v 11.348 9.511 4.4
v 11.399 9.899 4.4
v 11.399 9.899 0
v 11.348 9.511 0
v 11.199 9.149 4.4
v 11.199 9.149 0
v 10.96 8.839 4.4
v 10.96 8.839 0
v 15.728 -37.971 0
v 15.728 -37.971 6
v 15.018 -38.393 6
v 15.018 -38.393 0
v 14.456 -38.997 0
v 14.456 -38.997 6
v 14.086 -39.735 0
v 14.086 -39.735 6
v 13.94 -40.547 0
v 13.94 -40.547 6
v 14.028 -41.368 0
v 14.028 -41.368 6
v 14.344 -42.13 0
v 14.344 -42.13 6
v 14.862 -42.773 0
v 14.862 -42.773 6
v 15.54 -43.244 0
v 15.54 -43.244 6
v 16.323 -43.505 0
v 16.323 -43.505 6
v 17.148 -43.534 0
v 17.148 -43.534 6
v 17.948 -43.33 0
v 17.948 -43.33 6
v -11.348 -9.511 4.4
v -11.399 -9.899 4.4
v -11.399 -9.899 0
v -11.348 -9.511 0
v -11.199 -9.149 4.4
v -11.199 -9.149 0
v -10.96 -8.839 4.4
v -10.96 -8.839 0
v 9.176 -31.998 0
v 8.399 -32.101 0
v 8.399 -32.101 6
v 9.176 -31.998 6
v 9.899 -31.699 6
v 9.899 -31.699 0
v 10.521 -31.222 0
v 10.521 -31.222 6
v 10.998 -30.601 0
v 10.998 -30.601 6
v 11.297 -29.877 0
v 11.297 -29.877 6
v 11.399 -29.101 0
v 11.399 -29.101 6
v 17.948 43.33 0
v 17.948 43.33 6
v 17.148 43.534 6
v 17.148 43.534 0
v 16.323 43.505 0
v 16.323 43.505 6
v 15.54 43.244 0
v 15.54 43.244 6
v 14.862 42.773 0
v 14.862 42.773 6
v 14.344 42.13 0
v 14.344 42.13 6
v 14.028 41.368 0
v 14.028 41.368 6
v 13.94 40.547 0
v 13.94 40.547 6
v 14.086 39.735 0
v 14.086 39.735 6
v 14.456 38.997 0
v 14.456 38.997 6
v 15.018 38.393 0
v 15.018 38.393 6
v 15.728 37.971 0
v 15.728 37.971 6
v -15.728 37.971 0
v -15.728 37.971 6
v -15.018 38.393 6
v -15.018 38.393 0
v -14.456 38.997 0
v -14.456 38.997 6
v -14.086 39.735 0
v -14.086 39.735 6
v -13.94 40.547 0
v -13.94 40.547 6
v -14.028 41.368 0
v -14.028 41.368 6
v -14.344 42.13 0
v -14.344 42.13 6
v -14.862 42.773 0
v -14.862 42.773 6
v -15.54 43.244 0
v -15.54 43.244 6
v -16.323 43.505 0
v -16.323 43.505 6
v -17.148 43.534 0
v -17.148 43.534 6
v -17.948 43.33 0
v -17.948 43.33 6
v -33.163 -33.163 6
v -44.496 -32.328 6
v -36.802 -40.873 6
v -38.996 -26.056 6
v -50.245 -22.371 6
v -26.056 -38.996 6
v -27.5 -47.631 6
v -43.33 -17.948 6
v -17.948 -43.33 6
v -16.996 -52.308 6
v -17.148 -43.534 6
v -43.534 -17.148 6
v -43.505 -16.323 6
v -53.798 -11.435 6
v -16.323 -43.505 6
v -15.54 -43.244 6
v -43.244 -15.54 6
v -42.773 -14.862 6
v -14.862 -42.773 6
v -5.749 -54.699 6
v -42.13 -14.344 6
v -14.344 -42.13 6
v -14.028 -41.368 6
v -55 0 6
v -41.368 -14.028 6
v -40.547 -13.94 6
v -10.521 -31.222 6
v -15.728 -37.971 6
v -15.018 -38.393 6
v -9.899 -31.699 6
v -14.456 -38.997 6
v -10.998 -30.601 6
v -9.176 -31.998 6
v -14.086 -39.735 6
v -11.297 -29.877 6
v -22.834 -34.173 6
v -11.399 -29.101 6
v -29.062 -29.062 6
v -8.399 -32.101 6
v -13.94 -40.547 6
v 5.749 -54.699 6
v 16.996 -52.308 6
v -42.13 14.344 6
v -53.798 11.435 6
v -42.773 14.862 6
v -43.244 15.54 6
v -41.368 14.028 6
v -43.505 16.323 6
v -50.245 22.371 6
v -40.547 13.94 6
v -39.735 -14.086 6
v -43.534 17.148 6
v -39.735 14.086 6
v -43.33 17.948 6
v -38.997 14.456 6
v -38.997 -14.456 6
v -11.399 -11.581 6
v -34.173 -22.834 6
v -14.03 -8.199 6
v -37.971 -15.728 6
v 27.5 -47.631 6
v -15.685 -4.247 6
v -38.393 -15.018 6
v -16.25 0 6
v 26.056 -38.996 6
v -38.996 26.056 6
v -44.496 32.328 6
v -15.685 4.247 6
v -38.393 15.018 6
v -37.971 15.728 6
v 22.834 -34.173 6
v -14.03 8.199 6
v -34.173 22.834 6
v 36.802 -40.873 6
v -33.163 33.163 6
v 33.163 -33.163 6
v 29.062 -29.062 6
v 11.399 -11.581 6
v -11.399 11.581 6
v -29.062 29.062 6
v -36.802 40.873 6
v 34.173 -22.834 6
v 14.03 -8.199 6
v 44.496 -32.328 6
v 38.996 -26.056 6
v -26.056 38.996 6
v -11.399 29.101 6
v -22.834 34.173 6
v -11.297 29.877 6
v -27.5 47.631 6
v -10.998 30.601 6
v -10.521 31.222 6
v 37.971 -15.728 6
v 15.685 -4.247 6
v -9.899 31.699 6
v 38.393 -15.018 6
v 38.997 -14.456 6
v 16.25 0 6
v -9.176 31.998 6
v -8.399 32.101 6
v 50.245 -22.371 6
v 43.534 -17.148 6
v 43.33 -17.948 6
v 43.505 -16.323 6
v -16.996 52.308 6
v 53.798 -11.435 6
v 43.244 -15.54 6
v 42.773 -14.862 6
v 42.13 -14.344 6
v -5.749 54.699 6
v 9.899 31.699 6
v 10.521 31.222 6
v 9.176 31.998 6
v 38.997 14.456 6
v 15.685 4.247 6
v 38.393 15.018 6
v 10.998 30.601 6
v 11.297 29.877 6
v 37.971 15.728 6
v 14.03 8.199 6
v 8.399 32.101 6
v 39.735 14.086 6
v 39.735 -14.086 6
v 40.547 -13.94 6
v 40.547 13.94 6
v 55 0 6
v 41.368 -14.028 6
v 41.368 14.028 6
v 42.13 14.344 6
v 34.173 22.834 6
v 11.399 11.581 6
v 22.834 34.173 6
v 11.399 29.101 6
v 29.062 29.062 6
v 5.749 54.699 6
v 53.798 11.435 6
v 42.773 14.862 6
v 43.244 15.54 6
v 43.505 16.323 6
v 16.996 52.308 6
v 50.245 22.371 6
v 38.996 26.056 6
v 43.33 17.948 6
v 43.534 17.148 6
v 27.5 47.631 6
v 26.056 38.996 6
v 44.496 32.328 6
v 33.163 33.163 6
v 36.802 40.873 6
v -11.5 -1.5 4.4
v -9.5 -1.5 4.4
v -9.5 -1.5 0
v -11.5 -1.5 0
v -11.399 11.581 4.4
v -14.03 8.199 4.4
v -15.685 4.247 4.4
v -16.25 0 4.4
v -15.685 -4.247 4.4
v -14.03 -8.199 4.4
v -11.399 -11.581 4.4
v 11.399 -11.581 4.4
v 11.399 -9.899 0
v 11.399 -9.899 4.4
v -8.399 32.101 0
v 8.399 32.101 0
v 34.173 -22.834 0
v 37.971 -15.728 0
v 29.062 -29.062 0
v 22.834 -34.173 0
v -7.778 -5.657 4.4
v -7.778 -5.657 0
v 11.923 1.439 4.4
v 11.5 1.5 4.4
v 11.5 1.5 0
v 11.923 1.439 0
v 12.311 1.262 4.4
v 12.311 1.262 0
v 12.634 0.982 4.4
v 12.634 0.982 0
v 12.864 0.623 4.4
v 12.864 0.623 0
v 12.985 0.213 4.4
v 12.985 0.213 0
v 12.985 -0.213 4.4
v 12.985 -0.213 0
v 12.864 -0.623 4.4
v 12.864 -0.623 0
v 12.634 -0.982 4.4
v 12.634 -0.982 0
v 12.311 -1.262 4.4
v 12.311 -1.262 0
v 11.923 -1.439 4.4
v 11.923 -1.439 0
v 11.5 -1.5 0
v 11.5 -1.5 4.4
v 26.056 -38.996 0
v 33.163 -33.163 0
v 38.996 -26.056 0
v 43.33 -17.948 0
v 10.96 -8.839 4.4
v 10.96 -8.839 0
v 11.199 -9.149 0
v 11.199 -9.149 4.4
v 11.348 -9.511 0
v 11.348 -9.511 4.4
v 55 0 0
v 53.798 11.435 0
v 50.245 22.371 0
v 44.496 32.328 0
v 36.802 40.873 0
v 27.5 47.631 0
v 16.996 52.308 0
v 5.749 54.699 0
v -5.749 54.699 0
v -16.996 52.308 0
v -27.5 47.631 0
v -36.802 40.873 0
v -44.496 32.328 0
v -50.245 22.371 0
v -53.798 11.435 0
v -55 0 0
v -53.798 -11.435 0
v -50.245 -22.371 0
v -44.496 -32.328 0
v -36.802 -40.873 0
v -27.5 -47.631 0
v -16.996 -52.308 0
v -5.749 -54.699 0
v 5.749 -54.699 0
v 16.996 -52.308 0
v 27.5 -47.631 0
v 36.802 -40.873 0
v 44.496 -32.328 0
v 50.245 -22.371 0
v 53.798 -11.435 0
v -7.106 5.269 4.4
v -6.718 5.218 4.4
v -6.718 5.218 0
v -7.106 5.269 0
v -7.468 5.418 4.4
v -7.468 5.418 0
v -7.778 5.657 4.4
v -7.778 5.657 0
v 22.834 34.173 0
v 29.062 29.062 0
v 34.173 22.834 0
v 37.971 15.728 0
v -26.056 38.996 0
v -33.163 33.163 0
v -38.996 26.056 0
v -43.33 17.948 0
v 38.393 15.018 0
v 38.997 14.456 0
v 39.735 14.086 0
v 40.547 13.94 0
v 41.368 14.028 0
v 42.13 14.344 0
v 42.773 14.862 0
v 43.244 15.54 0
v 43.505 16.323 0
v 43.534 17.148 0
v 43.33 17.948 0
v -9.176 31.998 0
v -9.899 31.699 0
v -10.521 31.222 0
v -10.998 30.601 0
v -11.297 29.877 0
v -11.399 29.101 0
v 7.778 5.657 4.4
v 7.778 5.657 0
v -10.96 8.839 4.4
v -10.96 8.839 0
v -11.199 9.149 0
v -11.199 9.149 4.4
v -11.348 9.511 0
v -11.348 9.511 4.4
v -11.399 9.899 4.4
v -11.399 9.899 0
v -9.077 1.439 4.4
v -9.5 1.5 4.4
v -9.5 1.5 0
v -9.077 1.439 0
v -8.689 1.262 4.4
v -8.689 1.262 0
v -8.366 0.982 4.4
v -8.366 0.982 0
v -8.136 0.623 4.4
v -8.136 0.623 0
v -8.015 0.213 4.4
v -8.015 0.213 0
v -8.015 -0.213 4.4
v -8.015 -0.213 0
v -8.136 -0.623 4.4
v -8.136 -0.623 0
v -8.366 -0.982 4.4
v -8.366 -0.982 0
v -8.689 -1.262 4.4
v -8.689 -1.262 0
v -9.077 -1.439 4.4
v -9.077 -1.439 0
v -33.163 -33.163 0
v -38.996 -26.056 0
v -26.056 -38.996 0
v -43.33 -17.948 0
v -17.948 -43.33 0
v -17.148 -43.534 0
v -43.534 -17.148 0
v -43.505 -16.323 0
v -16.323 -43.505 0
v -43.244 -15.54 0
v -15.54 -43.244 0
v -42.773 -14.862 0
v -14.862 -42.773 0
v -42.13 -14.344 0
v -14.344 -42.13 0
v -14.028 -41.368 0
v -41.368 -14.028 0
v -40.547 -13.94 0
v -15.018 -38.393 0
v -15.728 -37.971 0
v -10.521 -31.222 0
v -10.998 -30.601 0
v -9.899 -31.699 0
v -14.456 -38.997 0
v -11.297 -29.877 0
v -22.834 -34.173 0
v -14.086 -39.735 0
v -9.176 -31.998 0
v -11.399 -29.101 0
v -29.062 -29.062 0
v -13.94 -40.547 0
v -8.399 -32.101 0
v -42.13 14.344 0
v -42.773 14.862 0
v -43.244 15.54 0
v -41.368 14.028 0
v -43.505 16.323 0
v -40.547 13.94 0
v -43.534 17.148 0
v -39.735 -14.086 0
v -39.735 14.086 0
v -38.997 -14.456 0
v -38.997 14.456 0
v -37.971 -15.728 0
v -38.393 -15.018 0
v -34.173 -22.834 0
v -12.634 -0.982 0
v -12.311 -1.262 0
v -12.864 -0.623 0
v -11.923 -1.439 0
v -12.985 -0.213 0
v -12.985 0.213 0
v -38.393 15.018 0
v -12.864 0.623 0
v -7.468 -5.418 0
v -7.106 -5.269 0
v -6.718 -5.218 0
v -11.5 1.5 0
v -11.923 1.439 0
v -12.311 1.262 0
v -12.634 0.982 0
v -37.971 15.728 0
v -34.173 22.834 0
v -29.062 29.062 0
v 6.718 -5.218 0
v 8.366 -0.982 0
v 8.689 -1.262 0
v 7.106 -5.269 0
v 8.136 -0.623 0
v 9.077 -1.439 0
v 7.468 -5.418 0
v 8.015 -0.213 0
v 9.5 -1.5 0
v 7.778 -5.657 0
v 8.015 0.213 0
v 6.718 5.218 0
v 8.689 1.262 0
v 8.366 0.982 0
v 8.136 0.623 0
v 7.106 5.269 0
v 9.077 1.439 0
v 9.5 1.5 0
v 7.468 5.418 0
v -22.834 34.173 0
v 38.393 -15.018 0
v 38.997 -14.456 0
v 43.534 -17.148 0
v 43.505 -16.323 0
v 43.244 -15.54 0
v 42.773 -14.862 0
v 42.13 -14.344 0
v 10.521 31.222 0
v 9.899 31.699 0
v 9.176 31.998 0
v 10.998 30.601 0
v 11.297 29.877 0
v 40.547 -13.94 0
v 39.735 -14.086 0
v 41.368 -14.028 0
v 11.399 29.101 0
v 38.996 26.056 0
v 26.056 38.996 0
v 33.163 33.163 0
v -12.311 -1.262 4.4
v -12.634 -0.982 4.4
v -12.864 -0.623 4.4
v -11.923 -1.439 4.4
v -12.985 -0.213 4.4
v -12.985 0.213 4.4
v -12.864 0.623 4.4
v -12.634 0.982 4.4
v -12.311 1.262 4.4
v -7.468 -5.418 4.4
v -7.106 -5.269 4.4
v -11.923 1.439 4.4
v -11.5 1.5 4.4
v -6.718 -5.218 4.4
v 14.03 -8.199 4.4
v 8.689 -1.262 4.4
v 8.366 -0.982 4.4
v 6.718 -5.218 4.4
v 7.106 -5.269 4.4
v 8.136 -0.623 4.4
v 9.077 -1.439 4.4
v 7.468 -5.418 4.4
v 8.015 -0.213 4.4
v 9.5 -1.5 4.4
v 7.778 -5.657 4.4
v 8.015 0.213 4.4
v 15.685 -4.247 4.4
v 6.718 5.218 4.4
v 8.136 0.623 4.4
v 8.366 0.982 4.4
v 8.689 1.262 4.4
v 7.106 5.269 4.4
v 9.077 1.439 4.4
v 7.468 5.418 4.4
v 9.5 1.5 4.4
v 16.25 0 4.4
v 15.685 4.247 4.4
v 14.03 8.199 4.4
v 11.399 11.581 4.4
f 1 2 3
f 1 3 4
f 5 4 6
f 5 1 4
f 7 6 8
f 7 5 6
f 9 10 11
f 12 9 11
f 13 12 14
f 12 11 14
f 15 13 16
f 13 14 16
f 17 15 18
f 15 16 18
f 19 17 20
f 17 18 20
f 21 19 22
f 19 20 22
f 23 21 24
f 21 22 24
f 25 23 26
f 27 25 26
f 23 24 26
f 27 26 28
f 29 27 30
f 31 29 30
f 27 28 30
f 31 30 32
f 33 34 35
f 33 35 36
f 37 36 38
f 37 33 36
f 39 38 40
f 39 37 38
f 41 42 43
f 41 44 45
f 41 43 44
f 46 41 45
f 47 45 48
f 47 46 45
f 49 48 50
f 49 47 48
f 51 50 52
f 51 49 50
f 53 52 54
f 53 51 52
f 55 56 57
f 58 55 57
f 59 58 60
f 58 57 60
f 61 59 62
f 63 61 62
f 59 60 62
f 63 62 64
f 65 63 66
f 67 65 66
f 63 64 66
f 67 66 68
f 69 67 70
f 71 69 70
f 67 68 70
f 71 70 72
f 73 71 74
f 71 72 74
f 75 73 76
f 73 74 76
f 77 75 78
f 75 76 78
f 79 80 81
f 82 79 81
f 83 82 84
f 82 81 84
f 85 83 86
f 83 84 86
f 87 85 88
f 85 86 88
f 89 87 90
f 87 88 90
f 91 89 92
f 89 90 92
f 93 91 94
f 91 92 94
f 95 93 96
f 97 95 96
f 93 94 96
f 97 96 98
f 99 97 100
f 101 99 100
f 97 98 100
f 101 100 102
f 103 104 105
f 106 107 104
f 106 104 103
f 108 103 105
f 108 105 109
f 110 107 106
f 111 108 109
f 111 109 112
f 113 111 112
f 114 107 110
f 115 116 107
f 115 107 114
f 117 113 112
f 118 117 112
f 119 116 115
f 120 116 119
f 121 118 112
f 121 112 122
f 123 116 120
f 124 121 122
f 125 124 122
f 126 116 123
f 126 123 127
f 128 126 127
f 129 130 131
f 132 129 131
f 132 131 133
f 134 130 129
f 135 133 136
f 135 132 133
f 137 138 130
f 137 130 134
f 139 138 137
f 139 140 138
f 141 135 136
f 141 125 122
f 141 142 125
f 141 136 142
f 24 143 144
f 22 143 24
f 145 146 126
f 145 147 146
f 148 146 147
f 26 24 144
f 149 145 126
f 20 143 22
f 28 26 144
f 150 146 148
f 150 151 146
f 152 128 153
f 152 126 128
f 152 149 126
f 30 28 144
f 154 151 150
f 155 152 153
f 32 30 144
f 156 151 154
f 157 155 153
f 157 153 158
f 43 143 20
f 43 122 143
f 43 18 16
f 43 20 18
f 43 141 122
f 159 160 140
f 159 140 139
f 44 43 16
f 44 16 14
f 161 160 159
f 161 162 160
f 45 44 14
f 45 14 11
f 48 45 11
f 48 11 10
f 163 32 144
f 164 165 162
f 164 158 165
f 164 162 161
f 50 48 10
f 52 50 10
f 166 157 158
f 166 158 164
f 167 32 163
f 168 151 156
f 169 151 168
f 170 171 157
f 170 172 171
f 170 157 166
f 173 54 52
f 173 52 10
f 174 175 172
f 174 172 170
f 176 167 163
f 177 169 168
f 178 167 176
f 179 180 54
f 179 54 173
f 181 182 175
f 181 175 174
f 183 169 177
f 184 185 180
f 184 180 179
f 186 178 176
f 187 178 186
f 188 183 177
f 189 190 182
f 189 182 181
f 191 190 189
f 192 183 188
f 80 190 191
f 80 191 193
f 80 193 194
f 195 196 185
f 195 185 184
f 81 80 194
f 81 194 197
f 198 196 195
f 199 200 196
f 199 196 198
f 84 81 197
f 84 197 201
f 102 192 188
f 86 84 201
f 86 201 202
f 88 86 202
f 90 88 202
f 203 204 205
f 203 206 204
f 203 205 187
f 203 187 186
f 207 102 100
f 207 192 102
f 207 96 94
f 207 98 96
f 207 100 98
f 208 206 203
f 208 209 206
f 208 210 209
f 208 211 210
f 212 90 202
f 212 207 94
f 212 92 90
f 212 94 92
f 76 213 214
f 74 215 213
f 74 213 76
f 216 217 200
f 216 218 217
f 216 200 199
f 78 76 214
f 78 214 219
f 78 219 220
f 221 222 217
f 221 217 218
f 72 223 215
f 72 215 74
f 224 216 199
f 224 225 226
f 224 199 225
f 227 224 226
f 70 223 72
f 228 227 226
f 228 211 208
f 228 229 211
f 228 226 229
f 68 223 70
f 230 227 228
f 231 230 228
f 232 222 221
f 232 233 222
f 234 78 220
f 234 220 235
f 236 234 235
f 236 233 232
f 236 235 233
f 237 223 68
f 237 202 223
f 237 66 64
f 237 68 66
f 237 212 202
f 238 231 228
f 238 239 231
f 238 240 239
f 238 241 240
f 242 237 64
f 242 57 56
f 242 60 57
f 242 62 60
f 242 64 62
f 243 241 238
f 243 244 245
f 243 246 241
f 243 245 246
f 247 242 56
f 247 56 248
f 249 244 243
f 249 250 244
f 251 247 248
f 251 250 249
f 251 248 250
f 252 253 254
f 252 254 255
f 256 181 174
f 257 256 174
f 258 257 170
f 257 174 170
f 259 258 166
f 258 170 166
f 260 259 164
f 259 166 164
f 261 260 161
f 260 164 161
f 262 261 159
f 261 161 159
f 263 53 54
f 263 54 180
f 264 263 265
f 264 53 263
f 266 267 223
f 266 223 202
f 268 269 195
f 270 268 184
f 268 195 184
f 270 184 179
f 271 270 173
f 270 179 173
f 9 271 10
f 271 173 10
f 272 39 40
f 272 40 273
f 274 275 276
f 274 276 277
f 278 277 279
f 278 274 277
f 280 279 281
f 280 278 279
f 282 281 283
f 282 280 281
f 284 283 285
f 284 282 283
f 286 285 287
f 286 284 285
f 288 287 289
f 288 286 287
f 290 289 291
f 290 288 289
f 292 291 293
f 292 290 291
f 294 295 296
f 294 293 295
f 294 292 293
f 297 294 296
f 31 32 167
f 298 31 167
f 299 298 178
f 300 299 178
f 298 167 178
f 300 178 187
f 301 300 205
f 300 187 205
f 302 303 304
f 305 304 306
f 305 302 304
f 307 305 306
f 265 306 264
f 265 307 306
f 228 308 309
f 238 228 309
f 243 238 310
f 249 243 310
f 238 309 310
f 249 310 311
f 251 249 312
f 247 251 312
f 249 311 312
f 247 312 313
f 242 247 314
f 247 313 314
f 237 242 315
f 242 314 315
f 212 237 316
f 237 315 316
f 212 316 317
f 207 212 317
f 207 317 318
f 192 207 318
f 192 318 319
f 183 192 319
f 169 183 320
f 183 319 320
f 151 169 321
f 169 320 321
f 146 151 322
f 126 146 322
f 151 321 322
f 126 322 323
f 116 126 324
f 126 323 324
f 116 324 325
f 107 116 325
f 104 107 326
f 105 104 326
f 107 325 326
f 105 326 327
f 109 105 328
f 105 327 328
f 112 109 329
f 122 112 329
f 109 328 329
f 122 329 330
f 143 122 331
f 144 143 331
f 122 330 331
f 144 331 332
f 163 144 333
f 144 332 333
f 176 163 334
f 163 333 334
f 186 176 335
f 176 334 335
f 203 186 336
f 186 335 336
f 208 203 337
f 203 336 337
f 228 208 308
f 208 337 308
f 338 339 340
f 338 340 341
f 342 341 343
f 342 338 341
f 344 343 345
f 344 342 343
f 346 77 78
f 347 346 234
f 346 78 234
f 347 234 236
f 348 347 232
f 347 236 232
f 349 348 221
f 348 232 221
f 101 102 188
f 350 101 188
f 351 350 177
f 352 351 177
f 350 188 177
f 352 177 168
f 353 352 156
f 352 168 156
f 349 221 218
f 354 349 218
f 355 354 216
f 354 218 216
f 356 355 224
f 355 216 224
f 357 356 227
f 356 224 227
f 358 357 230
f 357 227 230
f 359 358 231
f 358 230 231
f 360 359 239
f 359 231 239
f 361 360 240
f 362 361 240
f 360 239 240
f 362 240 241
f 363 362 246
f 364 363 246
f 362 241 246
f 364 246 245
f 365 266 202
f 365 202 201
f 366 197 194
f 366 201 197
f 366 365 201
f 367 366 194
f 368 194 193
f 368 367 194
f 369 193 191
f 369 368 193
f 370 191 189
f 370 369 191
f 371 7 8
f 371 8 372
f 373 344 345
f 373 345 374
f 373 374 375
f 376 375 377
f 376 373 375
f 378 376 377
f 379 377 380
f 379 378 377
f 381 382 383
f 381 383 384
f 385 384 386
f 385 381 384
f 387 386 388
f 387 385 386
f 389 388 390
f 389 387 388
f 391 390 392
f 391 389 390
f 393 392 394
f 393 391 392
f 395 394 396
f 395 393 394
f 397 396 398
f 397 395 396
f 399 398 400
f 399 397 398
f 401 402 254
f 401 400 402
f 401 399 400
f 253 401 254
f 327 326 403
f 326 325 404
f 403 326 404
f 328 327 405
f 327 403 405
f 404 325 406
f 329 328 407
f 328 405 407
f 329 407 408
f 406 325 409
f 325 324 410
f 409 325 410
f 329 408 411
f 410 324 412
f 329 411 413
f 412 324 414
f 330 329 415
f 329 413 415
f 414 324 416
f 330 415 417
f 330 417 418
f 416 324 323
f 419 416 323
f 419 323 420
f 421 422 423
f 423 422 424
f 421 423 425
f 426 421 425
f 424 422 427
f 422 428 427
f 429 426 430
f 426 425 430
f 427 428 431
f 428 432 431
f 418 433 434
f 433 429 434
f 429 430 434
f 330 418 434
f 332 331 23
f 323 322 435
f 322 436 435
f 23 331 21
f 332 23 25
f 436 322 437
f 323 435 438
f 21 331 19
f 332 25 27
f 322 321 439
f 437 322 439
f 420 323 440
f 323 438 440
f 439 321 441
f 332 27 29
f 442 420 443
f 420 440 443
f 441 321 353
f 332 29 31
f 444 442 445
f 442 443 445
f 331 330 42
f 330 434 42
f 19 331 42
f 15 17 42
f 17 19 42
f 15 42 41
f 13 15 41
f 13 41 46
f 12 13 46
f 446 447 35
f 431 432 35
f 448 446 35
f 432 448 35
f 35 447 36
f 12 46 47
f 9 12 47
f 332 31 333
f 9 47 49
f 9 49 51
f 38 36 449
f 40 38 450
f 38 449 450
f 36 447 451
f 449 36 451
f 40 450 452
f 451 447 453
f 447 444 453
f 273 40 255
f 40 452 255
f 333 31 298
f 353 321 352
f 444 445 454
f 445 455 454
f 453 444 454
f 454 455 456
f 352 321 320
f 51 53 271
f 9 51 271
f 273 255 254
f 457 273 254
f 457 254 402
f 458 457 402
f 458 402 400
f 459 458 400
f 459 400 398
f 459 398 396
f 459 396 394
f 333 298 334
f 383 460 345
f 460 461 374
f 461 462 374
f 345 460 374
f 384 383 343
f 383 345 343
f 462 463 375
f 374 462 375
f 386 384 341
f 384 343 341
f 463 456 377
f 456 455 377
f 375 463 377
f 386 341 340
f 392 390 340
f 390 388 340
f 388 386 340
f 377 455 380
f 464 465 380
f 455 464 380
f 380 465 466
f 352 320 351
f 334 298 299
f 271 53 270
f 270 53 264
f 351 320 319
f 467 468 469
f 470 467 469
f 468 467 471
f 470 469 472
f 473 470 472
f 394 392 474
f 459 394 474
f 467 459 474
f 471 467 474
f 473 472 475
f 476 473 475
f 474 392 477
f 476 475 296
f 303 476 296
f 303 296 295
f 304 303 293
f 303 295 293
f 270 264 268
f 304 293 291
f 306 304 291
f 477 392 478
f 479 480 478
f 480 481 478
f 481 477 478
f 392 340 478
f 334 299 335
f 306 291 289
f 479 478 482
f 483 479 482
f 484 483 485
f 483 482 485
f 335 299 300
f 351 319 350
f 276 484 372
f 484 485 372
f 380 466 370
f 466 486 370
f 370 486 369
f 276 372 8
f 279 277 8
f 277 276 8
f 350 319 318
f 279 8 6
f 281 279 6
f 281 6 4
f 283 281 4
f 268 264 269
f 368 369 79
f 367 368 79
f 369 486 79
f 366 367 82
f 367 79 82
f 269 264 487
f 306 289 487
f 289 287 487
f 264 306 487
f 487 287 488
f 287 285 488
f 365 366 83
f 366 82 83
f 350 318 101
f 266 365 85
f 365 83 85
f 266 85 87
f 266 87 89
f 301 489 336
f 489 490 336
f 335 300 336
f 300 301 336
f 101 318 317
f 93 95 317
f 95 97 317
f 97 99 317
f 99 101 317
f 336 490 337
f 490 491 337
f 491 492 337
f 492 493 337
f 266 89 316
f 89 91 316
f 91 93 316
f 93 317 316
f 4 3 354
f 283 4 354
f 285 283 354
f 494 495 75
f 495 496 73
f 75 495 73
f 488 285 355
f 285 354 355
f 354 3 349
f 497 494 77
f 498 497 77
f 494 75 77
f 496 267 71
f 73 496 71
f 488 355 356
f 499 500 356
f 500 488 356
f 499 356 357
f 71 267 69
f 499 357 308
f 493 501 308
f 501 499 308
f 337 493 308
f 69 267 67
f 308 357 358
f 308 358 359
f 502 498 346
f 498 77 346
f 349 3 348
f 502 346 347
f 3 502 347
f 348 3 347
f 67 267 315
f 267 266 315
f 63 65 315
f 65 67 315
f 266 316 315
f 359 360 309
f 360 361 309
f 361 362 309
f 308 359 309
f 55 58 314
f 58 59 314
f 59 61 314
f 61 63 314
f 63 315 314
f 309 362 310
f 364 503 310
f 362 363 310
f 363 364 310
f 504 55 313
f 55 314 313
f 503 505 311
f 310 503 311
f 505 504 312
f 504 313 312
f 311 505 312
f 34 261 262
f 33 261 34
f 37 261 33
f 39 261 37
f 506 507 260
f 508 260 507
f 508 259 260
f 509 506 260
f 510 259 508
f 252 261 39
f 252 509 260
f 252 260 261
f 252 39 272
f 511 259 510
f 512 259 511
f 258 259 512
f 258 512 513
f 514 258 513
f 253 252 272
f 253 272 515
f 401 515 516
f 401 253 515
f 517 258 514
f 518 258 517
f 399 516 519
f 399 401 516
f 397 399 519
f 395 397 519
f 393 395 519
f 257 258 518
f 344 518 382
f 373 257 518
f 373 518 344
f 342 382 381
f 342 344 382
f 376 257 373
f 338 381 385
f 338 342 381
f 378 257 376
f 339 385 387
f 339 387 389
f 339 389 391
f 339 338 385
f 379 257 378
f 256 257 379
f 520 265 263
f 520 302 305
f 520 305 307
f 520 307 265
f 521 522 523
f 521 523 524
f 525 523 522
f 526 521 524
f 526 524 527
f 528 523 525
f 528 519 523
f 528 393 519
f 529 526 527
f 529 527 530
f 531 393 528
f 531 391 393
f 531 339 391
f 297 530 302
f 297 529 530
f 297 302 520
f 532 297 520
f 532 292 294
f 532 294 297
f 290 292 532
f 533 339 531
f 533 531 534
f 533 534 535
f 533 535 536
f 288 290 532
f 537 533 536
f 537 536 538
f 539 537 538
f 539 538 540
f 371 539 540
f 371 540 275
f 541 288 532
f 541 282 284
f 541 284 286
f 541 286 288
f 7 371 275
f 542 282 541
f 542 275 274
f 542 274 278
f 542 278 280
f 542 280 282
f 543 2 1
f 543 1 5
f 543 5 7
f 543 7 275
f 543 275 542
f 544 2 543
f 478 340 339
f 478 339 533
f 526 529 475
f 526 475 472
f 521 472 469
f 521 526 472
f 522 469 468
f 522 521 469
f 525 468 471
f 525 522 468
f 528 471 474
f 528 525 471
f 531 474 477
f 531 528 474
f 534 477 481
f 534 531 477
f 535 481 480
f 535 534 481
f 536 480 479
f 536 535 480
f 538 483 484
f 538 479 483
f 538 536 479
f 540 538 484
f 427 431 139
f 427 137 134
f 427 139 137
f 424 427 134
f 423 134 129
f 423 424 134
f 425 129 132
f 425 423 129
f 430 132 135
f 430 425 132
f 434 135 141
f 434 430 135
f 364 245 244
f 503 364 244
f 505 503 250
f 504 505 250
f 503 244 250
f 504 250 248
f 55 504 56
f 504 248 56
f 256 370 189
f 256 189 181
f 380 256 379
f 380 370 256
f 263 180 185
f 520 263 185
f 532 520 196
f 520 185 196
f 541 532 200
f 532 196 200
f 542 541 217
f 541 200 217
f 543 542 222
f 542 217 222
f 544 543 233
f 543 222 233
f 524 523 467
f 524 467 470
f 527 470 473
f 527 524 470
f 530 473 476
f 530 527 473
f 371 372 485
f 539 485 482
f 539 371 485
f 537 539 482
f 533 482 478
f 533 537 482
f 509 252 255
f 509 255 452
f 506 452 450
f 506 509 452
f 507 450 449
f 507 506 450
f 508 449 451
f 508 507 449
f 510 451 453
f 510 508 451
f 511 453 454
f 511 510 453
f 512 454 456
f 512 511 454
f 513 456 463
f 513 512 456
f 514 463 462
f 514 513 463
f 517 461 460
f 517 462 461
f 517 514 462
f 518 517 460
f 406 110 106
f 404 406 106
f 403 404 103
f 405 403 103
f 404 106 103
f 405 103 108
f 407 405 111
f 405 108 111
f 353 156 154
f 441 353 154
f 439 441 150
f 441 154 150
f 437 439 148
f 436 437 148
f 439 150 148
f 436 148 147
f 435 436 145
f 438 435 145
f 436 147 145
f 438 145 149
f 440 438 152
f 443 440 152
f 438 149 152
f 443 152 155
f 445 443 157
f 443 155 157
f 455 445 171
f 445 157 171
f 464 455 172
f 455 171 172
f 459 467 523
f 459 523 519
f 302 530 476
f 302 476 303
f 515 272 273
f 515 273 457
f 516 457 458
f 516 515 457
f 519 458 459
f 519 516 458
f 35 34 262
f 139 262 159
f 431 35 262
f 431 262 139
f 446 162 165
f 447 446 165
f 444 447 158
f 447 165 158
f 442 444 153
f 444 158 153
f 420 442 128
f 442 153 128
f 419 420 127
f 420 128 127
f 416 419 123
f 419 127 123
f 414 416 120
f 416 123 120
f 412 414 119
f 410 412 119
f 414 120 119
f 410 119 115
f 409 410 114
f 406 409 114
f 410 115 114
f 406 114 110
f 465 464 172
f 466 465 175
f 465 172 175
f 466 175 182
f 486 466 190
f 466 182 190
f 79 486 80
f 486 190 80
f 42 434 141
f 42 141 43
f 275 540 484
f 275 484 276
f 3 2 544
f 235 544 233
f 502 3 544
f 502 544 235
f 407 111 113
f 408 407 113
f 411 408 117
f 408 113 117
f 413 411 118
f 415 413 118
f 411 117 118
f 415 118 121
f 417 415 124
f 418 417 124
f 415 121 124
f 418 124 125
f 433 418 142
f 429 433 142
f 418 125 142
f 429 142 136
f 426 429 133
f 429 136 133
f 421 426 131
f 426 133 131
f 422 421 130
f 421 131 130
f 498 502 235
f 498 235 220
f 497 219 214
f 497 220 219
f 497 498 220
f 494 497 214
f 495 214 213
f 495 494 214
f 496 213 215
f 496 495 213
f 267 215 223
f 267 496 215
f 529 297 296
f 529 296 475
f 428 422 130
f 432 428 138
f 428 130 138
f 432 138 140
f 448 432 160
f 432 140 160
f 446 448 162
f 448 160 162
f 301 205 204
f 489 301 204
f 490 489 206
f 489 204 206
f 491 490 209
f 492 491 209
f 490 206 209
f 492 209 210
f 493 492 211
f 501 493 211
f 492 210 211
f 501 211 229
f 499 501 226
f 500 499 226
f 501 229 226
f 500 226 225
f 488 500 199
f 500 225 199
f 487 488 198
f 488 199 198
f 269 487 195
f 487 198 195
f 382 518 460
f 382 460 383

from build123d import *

# Parameters (mm, degrees)
SKETCH1_R               = 55
BOSS_EXTRUDE1_DEPTH     = 6
CUT_EXTRUDE1_DEPTH      = 79.012819459
SKETCH4_R               = 16.25
CUT_EXTRUDE2_DEPTH      = 1.6
CUT_EXTRUDE3_DEPTH      = 78.906097322
CUT_EXTRUDE4_DEPTH      = 78.906097322
CUT_EXTRUDE4_DEPTH_BACK = 78.906097322


with BuildPart() as part:
    # Sketch1 → Boss-Extrude1 (new body)
    with BuildSketch(Plane.XY):
        Circle(SKETCH1_R)
    extrude(amount=BOSS_EXTRUDE1_DEPTH)

    # Sketch3 → Cut-Extrude1 (cut, through all)
    with BuildSketch(Plane.XY.offset(6)):
        with BuildLine():
            ThreePointArc((-15.72828907, 37.971448786), (-14.15882038, 41.760481384), (-17.947852978, 43.329950075))
            ThreePointArc((-17.947852978, 43.329950075), (-33.163308038, 33.163308038), (-43.329950075, 17.947852978))
            ThreePointArc((-43.329950075, 17.947852978), (-41.760481384, 14.15882038), (-37.971448786, 15.72828907))
            ThreePointArc((-37.971448786, 15.72828907), (-29.062088707, 29.062088707), (-15.72828907, 37.971448786))
        make_face()
        with BuildLine():
            ThreePointArc((17.947852978, 43.329950075), (14.15882038, 41.760481384), (15.72828907, 37.971448786))
            ThreePointArc((15.72828907, 37.971448786), (29.062088707, 29.062088707), (37.971448786, 15.72828907))
            ThreePointArc((37.971448786, 15.72828907), (41.760481384, 14.15882038), (43.329950075, 17.947852978))
            ThreePointArc((43.329950075, 17.947852978), (33.163308038, 33.163308038), (17.947852978, 43.329950075))
        make_face()
        with BuildLine():
            ThreePointArc((43.329950075, -17.947852978), (41.760481384, -14.15882038), (37.971448786, -15.72828907))
            ThreePointArc((37.971448786, -15.72828907), (29.062088707, -29.062088707), (15.72828907, -37.971448786))
            ThreePointArc((15.72828907, -37.971448786), (14.15882038, -41.760481384), (17.947852978, -43.329950075))
            ThreePointArc((17.947852978, -43.329950075), (33.163308038, -33.163308038), (43.329950075, -17.947852978))
        make_face()
        with BuildLine():
            ThreePointArc((-17.947852978, -43.329950075), (-14.15882038, -41.760481384), (-15.72828907, -37.971448786))
            ThreePointArc((-15.72828907, -37.971448786), (-29.062088707, -29.062088707), (-37.971448786, -15.72828907))
            ThreePointArc((-37.971448786, -15.72828907), (-41.760481384, -14.15882038), (-43.329950075, -17.947852978))
            ThreePointArc((-43.329950075, -17.947852978), (-33.163308038, -33.163308038), (-17.947852978, -43.329950075))
        make_face()
    extrude(amount=-CUT_EXTRUDE1_DEPTH, mode=Mode.SUBTRACT)

    # Sketch4 → Cut-Extrude2 (cut)
    with BuildSketch(Plane.XY.offset(6)):
        Circle(SKETCH4_R)
    extrude(amount=-CUT_EXTRUDE2_DEPTH, mode=Mode.SUBTRACT)

    # Sketch5 → Cut-Extrude3 (cut, through all)
    with BuildSketch(Plane.XY.offset(4.4)):
        with BuildLine():
            Line((-5.656854249, -7.778174593), (-8.838834765, -10.960155108))
            ThreePointArc((-8.838834765, -10.960155108), (-10.960155108, -10.960155108), (-10.960155108, -8.838834765))
            Line((-10.960155108, -8.838834765), (-7.778174593, -5.656854249))
            ThreePointArc((-7.778174593, -5.656854249), (-5.656854249, -5.656854249), (-5.656854249, -7.778174593))
        make_face()
        with BuildLine():
            Line((-9.5, -1.5), (-11.5, -1.5))
            ThreePointArc((-11.5, -1.5), (-13, 0), (-11.5, 1.5))
            Line((-11.5, 1.5), (-9.5, 1.5))
            ThreePointArc((-9.5, 1.5), (-8, 0), (-9.5, -1.5))
        make_face()
        with BuildLine():
            Line((-7.778174593, 5.656854249), (-10.960155108, 8.838834765))
            ThreePointArc((-10.960155108, 8.838834765), (-10.960155108, 10.960155108), (-8.838834765, 10.960155108))
            Line((-8.838834765, 10.960155108), (-5.656854249, 7.778174593))
            ThreePointArc((-5.656854249, 7.778174593), (-5.656854249, 5.656854249), (-7.778174593, 5.656854249))
        make_face()
        with BuildLine():
            Line((5.656854249, 7.778174593), (8.838834765, 10.960155108))
            ThreePointArc((8.838834765, 10.960155108), (10.960155108, 10.960155108), (10.960155108, 8.838834765))
            Line((10.960155108, 8.838834765), (7.778174593, 5.656854249))
            ThreePointArc((7.778174593, 5.656854249), (5.656854249, 5.656854249), (5.656854249, 7.778174593))
        make_face()
        with BuildLine():
            Line((7.778174593, -5.656854249), (10.960155108, -8.838834765))
            ThreePointArc((10.960155108, -8.838834765), (10.960155108, -10.960155108), (8.838834765, -10.960155108))
            Line((8.838834765, -10.960155108), (5.656854249, -7.778174593))
            ThreePointArc((5.656854249, -7.778174593), (5.656854249, -5.656854249), (7.778174593, -5.656854249))
        make_face()
        with BuildLine():
            Line((9.5, 1.5), (11.5, 1.5))
            ThreePointArc((11.5, 1.5), (13, 0), (11.5, -1.5))
            Line((11.5, -1.5), (9.5, -1.5))
            ThreePointArc((9.5, -1.5), (8, 0), (9.5, 1.5))
        make_face()
    extrude(amount=-CUT_EXTRUDE3_DEPTH, mode=Mode.SUBTRACT)

    # Sketch6 → Cut-Extrude4 (cut, two sides: drawn at the far end of the back side and taken through both)
    with BuildSketch(Plane.XY.offset(4.4).offset(-CUT_EXTRUDE4_DEPTH_BACK)):
        with BuildLine():
            Line((-8.399494937, -32.100505062), (8.399494937, -32.100505062))
            ThreePointArc((8.399494937, -32.100505062), (10.52081528, -31.221825406), (11.399494937, -29.100505062))
            Line((11.399494937, -29.100505062), (11.399494937, -9.899494935))
            Line((11.399494937, -9.899494935), (6.717514421, -5.21751442))
            Line((6.717514421, -5.21751442), (-6.717514421, -5.21751442))
            Line((-6.717514421, -5.21751442), (-11.399494937, -9.899494935))
            Line((-11.399494937, -9.899494935), (-11.399494937, -29.100505062))
            ThreePointArc((-11.399494937, -29.100505062), (-10.52081528, -31.221825406), (-8.399494937, -32.100505062))
        make_face()
        with BuildLine():
            Line((8.399494937, 32.100505063), (-8.399494937, 32.100505063))
            ThreePointArc((-8.399494937, 32.100505063), (-10.52081528, 31.221825407), (-11.399494937, 29.100505063))
            Line((-11.399494937, 29.100505063), (-11.399494937, 9.899494937))
            Line((-11.399494937, 9.899494937), (-6.717514421, 5.217514421))
            Line((-6.717514421, 5.217514421), (6.717514421, 5.217514421))
            Line((6.717514421, 5.217514421), (11.399494937, 9.899494937))
            Line((11.399494937, 9.899494937), (11.399494937, 29.100505063))
            ThreePointArc((11.399494937, 29.100505063), (10.52081528, 31.221825407), (8.399494937, 32.100505063))
        make_face()
    extrude(amount=CUT_EXTRUDE4_DEPTH + CUT_EXTRUDE4_DEPTH_BACK, mode=Mode.SUBTRACT)


solid = part.part
